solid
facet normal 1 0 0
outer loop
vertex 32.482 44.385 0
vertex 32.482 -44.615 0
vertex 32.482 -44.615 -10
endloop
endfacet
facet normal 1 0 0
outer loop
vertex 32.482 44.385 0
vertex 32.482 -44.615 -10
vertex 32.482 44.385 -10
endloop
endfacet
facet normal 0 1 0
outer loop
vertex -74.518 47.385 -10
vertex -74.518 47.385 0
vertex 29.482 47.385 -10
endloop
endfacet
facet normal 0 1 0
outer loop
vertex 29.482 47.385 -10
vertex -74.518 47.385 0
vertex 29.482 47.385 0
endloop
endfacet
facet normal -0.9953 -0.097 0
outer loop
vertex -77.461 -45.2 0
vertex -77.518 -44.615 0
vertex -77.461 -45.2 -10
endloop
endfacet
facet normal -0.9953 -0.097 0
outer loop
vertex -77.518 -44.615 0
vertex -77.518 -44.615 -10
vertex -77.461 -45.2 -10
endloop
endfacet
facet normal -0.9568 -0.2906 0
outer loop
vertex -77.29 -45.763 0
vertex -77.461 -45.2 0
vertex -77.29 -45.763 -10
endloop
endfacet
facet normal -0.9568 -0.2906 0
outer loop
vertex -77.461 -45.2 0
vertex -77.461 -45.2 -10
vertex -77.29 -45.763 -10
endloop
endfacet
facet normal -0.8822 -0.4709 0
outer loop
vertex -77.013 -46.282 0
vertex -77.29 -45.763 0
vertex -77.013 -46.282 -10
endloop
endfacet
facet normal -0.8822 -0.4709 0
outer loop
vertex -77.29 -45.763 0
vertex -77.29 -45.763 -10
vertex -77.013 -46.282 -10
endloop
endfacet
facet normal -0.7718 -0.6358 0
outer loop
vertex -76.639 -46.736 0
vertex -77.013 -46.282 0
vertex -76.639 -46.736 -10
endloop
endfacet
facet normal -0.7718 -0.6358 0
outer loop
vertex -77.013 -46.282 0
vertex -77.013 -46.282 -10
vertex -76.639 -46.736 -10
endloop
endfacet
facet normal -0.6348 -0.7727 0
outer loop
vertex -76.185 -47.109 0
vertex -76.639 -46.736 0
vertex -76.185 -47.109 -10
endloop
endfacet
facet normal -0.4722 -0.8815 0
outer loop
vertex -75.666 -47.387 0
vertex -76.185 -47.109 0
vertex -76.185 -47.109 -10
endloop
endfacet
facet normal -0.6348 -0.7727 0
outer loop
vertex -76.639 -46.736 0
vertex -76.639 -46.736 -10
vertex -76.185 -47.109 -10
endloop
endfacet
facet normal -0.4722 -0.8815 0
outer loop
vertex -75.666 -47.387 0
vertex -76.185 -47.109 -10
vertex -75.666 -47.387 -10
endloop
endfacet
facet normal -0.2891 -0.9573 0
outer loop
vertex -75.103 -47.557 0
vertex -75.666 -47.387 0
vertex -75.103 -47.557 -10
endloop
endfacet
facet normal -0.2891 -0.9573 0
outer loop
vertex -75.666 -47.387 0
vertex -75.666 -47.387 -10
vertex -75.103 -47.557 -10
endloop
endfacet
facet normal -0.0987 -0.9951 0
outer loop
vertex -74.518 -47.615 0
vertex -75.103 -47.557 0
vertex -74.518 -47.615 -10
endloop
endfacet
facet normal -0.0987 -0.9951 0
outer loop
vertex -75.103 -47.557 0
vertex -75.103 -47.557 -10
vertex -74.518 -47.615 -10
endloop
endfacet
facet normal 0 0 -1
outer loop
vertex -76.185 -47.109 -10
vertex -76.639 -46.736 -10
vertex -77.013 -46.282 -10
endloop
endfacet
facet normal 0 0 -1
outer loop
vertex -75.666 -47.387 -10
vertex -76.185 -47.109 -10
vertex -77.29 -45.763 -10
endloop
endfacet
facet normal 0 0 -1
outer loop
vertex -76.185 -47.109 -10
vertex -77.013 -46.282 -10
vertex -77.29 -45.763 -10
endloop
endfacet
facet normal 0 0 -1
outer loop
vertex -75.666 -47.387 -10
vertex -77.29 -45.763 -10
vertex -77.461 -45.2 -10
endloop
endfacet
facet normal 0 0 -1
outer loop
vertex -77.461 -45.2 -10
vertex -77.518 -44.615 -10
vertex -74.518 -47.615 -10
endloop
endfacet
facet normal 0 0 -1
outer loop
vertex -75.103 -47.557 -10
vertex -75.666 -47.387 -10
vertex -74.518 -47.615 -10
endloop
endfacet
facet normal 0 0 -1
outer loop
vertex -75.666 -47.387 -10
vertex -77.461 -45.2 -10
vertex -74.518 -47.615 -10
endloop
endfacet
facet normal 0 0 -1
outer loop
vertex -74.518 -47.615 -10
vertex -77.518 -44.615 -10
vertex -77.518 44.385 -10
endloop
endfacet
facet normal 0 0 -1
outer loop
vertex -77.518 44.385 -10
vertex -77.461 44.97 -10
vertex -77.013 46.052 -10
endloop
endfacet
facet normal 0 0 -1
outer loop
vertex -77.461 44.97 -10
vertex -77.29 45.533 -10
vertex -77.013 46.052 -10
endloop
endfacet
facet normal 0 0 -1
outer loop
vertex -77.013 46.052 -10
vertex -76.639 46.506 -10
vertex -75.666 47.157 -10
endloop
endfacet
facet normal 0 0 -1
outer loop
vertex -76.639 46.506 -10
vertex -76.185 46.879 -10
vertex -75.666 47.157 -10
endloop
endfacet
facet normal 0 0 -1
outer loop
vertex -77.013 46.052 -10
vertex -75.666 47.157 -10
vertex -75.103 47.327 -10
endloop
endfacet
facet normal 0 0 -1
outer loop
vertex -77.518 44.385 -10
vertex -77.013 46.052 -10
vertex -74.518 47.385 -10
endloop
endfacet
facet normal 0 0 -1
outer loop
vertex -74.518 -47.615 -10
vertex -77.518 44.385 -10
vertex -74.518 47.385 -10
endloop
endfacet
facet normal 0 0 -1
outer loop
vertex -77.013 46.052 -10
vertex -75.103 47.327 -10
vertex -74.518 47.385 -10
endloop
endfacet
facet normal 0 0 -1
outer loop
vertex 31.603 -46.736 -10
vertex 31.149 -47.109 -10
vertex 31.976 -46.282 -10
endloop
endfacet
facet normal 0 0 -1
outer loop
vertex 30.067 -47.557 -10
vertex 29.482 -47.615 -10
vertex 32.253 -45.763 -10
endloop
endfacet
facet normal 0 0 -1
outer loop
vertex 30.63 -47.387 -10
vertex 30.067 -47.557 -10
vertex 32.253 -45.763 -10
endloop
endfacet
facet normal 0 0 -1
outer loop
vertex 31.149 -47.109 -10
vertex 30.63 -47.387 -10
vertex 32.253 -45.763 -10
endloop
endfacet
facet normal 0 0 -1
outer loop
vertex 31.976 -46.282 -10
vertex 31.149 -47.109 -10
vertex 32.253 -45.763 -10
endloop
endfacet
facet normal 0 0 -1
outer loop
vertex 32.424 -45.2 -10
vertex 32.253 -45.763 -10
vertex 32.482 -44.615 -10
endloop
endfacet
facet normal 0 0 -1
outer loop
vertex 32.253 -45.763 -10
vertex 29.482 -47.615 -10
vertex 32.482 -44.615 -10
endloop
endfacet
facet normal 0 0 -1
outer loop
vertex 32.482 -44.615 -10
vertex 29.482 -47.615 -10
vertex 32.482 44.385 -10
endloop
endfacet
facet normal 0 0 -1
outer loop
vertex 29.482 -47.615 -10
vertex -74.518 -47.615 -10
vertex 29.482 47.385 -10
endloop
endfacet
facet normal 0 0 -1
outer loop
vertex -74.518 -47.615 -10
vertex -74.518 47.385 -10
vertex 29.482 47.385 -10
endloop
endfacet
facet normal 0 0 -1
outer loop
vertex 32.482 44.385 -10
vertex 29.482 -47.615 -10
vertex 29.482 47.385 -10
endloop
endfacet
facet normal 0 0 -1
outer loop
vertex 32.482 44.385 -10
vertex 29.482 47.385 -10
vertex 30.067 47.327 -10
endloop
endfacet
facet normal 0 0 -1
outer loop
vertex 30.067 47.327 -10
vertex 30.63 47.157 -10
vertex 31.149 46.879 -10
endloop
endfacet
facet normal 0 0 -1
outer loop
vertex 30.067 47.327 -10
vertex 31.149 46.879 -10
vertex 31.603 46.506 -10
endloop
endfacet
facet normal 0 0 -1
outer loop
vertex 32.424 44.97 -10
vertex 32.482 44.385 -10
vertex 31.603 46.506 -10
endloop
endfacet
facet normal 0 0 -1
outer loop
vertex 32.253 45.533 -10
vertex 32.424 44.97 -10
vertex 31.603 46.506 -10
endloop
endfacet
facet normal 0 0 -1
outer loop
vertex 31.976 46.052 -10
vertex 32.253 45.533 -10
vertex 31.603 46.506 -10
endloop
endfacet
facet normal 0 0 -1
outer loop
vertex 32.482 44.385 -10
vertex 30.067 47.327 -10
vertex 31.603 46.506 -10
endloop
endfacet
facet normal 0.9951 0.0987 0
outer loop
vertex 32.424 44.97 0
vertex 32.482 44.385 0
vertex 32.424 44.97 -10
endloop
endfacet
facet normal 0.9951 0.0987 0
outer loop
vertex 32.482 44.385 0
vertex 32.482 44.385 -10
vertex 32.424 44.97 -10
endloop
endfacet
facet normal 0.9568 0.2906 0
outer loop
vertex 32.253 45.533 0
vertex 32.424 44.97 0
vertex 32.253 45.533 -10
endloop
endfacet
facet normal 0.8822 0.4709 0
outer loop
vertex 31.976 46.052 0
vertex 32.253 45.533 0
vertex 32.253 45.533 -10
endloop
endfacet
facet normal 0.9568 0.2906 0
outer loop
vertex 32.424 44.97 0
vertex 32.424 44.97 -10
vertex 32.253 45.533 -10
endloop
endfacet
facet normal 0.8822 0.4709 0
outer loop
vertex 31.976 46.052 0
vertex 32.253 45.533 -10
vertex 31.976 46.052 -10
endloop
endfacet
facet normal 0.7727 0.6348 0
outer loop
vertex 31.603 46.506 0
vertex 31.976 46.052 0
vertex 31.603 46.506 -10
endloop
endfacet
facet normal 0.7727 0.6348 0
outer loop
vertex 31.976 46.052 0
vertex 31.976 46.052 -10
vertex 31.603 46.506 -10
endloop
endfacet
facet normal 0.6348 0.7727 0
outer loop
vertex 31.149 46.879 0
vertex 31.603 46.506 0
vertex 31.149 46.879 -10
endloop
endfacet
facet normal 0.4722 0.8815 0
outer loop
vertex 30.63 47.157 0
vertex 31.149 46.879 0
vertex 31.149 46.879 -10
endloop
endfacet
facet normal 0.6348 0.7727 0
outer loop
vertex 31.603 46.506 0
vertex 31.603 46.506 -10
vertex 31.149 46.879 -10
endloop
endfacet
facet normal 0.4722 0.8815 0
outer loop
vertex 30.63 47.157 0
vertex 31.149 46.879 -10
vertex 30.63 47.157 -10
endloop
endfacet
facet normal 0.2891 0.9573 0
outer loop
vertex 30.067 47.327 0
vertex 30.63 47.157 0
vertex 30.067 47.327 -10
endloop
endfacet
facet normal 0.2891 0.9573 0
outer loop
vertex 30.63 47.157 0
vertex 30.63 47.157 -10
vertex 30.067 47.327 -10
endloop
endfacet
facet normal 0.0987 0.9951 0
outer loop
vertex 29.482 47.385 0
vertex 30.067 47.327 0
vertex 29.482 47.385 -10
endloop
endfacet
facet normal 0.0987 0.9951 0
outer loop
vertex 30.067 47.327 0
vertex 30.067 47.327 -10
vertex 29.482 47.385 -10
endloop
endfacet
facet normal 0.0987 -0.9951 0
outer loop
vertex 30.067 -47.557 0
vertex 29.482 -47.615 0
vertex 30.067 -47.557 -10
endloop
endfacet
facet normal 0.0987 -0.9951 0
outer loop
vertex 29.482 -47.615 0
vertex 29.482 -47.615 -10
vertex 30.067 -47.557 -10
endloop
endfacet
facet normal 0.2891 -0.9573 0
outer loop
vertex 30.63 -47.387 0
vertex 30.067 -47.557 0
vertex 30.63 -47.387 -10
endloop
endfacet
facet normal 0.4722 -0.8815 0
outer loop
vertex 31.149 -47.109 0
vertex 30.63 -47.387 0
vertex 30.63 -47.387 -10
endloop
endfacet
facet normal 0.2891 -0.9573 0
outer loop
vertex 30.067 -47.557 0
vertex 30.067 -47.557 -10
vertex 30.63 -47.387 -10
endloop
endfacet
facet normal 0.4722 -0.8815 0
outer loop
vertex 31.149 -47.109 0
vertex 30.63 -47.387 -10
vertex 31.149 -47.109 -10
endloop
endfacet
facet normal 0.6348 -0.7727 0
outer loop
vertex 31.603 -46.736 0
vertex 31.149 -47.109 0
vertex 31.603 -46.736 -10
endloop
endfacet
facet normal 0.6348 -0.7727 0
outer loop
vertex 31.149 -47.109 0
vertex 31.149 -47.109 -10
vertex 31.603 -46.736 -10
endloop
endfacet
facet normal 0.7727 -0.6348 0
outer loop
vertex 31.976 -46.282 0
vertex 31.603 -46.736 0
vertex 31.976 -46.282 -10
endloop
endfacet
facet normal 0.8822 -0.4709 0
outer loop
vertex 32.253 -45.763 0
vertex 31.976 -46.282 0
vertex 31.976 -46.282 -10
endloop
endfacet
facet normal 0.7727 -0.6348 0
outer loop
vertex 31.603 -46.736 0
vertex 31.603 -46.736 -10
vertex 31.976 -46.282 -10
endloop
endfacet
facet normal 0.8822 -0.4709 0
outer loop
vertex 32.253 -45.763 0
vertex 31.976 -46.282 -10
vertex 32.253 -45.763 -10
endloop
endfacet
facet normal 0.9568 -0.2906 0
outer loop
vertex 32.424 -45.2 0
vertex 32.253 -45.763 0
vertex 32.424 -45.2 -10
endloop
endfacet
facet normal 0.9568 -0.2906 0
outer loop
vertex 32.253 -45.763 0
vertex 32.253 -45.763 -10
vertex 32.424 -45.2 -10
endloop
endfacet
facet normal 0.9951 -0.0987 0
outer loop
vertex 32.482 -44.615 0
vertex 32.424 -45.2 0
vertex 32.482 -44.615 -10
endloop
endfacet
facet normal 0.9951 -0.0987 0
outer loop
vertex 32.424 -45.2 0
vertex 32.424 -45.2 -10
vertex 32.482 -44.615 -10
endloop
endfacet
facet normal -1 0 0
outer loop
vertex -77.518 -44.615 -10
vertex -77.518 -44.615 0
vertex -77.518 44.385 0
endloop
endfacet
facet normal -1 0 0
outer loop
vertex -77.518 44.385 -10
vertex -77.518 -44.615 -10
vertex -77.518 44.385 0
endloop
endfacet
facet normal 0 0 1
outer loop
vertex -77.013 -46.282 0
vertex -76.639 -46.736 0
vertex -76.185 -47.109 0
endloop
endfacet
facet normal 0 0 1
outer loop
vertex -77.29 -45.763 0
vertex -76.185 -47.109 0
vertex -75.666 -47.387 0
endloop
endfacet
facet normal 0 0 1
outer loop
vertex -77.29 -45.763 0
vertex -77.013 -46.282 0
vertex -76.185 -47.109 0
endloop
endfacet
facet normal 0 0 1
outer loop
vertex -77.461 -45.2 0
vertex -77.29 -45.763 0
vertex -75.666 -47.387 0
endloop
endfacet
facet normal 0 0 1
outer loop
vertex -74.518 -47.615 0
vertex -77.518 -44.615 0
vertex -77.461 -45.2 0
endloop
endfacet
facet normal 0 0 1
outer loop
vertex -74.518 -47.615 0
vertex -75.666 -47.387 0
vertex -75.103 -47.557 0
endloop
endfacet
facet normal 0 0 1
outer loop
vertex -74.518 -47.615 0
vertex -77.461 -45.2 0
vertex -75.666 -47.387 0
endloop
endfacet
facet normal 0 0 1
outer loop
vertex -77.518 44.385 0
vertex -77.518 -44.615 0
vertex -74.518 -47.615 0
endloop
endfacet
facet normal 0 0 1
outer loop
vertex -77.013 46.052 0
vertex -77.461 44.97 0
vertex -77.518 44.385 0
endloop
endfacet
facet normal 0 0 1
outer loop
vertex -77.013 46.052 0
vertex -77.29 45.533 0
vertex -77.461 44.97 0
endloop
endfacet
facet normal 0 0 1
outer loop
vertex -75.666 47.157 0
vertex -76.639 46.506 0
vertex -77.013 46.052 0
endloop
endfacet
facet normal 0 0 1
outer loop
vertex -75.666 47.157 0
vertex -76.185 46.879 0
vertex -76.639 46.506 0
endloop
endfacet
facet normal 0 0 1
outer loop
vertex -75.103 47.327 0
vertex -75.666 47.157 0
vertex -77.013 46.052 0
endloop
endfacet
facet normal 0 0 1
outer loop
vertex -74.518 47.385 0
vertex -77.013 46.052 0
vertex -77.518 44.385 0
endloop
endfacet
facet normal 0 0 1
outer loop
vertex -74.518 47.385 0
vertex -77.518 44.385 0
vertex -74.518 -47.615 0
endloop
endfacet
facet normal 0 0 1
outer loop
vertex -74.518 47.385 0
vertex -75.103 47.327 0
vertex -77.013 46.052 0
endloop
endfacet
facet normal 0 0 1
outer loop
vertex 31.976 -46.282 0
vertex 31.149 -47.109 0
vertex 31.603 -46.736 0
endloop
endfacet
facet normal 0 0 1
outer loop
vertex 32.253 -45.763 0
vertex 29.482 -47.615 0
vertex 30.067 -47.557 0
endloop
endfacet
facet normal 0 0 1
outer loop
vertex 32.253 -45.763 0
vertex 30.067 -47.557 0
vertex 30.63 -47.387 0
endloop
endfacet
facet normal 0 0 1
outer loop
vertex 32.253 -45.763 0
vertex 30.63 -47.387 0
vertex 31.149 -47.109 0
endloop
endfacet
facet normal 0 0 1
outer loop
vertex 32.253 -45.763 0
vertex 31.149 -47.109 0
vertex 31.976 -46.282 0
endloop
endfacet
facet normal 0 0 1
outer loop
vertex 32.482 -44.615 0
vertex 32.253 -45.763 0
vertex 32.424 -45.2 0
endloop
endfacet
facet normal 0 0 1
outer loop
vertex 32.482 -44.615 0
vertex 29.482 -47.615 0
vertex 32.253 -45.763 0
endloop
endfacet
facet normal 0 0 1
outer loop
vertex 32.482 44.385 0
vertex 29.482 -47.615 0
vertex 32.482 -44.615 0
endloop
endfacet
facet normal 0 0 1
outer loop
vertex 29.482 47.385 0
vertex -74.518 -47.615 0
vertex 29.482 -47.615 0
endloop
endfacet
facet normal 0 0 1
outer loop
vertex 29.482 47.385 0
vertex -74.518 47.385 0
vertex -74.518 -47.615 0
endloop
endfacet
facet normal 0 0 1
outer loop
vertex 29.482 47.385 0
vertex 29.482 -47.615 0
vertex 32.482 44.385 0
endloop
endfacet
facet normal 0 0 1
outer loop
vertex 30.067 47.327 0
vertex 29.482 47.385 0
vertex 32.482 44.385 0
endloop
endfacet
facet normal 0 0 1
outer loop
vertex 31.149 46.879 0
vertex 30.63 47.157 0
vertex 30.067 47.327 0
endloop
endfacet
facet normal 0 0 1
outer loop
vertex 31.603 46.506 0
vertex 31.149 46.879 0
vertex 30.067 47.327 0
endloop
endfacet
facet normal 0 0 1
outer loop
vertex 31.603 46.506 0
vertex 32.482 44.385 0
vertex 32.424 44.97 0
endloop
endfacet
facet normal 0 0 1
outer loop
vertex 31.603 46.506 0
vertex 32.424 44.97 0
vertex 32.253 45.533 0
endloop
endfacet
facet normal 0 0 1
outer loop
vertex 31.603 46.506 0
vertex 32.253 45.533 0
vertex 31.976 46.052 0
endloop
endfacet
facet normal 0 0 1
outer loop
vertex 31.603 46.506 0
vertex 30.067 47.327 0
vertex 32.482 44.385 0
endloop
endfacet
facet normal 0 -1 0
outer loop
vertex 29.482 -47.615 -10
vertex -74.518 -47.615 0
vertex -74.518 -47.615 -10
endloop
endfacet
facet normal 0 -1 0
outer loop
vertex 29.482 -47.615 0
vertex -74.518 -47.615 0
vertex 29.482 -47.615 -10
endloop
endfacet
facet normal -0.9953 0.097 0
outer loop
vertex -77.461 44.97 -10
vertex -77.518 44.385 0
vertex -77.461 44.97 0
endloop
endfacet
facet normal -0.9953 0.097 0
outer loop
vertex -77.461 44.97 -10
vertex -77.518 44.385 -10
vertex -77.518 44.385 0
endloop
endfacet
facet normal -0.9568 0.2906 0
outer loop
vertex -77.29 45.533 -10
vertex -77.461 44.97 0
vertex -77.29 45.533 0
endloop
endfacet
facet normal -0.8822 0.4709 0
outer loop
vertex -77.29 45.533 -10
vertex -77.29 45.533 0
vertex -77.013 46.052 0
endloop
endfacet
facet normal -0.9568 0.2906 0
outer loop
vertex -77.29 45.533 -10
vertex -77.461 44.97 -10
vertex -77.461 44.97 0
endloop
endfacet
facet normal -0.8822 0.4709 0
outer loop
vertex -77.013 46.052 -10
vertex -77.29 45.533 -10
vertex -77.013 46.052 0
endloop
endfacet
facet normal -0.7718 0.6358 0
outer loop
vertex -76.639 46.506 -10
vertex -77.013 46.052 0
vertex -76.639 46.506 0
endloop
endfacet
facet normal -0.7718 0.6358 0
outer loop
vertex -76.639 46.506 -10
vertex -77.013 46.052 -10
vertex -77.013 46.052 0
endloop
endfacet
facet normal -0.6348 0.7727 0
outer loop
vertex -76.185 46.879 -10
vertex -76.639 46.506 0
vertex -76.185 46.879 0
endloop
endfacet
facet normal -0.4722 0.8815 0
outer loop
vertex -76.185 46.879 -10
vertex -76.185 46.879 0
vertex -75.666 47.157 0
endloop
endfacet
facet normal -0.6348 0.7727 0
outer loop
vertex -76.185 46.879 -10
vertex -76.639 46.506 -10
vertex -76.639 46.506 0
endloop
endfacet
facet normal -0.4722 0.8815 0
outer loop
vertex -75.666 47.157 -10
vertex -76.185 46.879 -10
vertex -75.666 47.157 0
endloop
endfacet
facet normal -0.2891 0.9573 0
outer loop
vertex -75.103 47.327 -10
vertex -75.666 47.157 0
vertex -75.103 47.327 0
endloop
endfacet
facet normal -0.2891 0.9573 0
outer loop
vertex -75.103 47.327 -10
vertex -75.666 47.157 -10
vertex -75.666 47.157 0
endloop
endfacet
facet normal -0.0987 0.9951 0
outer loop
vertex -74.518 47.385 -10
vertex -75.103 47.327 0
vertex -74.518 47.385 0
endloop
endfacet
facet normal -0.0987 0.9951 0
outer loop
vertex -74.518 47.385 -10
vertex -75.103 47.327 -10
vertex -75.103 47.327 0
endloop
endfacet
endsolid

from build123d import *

# Parameters (mm, degrees)
SKETCH1_W           = 110
SKETCH1_H           = 95
BOSS_EXTRUDE2_DEPTH = 10
FILLET1_R           = 3


with BuildPart() as part:
    # Sketch1 → Boss-Extrude2 (new body)
    with BuildSketch(Plane.XY):
        with Locations((-22.518159806, -0.115012107)):
            Rectangle(SKETCH1_W, SKETCH1_H)
    extrude(amount=-BOSS_EXTRUDE2_DEPTH)

    # Fillet1
    fillet1_edges = [part.edges().sort_by_distance(p)[0] for p in [
        (-77.518159806, 47.384987893, -5),
        (32.481840194, 47.384987893, -5),
        (32.481840194, -47.615012107, -5),
        (-77.518159806, -47.615012107, -5),
    ]]
    fillet(fillet1_edges, radius=FILLET1_R)


solid = part.part
